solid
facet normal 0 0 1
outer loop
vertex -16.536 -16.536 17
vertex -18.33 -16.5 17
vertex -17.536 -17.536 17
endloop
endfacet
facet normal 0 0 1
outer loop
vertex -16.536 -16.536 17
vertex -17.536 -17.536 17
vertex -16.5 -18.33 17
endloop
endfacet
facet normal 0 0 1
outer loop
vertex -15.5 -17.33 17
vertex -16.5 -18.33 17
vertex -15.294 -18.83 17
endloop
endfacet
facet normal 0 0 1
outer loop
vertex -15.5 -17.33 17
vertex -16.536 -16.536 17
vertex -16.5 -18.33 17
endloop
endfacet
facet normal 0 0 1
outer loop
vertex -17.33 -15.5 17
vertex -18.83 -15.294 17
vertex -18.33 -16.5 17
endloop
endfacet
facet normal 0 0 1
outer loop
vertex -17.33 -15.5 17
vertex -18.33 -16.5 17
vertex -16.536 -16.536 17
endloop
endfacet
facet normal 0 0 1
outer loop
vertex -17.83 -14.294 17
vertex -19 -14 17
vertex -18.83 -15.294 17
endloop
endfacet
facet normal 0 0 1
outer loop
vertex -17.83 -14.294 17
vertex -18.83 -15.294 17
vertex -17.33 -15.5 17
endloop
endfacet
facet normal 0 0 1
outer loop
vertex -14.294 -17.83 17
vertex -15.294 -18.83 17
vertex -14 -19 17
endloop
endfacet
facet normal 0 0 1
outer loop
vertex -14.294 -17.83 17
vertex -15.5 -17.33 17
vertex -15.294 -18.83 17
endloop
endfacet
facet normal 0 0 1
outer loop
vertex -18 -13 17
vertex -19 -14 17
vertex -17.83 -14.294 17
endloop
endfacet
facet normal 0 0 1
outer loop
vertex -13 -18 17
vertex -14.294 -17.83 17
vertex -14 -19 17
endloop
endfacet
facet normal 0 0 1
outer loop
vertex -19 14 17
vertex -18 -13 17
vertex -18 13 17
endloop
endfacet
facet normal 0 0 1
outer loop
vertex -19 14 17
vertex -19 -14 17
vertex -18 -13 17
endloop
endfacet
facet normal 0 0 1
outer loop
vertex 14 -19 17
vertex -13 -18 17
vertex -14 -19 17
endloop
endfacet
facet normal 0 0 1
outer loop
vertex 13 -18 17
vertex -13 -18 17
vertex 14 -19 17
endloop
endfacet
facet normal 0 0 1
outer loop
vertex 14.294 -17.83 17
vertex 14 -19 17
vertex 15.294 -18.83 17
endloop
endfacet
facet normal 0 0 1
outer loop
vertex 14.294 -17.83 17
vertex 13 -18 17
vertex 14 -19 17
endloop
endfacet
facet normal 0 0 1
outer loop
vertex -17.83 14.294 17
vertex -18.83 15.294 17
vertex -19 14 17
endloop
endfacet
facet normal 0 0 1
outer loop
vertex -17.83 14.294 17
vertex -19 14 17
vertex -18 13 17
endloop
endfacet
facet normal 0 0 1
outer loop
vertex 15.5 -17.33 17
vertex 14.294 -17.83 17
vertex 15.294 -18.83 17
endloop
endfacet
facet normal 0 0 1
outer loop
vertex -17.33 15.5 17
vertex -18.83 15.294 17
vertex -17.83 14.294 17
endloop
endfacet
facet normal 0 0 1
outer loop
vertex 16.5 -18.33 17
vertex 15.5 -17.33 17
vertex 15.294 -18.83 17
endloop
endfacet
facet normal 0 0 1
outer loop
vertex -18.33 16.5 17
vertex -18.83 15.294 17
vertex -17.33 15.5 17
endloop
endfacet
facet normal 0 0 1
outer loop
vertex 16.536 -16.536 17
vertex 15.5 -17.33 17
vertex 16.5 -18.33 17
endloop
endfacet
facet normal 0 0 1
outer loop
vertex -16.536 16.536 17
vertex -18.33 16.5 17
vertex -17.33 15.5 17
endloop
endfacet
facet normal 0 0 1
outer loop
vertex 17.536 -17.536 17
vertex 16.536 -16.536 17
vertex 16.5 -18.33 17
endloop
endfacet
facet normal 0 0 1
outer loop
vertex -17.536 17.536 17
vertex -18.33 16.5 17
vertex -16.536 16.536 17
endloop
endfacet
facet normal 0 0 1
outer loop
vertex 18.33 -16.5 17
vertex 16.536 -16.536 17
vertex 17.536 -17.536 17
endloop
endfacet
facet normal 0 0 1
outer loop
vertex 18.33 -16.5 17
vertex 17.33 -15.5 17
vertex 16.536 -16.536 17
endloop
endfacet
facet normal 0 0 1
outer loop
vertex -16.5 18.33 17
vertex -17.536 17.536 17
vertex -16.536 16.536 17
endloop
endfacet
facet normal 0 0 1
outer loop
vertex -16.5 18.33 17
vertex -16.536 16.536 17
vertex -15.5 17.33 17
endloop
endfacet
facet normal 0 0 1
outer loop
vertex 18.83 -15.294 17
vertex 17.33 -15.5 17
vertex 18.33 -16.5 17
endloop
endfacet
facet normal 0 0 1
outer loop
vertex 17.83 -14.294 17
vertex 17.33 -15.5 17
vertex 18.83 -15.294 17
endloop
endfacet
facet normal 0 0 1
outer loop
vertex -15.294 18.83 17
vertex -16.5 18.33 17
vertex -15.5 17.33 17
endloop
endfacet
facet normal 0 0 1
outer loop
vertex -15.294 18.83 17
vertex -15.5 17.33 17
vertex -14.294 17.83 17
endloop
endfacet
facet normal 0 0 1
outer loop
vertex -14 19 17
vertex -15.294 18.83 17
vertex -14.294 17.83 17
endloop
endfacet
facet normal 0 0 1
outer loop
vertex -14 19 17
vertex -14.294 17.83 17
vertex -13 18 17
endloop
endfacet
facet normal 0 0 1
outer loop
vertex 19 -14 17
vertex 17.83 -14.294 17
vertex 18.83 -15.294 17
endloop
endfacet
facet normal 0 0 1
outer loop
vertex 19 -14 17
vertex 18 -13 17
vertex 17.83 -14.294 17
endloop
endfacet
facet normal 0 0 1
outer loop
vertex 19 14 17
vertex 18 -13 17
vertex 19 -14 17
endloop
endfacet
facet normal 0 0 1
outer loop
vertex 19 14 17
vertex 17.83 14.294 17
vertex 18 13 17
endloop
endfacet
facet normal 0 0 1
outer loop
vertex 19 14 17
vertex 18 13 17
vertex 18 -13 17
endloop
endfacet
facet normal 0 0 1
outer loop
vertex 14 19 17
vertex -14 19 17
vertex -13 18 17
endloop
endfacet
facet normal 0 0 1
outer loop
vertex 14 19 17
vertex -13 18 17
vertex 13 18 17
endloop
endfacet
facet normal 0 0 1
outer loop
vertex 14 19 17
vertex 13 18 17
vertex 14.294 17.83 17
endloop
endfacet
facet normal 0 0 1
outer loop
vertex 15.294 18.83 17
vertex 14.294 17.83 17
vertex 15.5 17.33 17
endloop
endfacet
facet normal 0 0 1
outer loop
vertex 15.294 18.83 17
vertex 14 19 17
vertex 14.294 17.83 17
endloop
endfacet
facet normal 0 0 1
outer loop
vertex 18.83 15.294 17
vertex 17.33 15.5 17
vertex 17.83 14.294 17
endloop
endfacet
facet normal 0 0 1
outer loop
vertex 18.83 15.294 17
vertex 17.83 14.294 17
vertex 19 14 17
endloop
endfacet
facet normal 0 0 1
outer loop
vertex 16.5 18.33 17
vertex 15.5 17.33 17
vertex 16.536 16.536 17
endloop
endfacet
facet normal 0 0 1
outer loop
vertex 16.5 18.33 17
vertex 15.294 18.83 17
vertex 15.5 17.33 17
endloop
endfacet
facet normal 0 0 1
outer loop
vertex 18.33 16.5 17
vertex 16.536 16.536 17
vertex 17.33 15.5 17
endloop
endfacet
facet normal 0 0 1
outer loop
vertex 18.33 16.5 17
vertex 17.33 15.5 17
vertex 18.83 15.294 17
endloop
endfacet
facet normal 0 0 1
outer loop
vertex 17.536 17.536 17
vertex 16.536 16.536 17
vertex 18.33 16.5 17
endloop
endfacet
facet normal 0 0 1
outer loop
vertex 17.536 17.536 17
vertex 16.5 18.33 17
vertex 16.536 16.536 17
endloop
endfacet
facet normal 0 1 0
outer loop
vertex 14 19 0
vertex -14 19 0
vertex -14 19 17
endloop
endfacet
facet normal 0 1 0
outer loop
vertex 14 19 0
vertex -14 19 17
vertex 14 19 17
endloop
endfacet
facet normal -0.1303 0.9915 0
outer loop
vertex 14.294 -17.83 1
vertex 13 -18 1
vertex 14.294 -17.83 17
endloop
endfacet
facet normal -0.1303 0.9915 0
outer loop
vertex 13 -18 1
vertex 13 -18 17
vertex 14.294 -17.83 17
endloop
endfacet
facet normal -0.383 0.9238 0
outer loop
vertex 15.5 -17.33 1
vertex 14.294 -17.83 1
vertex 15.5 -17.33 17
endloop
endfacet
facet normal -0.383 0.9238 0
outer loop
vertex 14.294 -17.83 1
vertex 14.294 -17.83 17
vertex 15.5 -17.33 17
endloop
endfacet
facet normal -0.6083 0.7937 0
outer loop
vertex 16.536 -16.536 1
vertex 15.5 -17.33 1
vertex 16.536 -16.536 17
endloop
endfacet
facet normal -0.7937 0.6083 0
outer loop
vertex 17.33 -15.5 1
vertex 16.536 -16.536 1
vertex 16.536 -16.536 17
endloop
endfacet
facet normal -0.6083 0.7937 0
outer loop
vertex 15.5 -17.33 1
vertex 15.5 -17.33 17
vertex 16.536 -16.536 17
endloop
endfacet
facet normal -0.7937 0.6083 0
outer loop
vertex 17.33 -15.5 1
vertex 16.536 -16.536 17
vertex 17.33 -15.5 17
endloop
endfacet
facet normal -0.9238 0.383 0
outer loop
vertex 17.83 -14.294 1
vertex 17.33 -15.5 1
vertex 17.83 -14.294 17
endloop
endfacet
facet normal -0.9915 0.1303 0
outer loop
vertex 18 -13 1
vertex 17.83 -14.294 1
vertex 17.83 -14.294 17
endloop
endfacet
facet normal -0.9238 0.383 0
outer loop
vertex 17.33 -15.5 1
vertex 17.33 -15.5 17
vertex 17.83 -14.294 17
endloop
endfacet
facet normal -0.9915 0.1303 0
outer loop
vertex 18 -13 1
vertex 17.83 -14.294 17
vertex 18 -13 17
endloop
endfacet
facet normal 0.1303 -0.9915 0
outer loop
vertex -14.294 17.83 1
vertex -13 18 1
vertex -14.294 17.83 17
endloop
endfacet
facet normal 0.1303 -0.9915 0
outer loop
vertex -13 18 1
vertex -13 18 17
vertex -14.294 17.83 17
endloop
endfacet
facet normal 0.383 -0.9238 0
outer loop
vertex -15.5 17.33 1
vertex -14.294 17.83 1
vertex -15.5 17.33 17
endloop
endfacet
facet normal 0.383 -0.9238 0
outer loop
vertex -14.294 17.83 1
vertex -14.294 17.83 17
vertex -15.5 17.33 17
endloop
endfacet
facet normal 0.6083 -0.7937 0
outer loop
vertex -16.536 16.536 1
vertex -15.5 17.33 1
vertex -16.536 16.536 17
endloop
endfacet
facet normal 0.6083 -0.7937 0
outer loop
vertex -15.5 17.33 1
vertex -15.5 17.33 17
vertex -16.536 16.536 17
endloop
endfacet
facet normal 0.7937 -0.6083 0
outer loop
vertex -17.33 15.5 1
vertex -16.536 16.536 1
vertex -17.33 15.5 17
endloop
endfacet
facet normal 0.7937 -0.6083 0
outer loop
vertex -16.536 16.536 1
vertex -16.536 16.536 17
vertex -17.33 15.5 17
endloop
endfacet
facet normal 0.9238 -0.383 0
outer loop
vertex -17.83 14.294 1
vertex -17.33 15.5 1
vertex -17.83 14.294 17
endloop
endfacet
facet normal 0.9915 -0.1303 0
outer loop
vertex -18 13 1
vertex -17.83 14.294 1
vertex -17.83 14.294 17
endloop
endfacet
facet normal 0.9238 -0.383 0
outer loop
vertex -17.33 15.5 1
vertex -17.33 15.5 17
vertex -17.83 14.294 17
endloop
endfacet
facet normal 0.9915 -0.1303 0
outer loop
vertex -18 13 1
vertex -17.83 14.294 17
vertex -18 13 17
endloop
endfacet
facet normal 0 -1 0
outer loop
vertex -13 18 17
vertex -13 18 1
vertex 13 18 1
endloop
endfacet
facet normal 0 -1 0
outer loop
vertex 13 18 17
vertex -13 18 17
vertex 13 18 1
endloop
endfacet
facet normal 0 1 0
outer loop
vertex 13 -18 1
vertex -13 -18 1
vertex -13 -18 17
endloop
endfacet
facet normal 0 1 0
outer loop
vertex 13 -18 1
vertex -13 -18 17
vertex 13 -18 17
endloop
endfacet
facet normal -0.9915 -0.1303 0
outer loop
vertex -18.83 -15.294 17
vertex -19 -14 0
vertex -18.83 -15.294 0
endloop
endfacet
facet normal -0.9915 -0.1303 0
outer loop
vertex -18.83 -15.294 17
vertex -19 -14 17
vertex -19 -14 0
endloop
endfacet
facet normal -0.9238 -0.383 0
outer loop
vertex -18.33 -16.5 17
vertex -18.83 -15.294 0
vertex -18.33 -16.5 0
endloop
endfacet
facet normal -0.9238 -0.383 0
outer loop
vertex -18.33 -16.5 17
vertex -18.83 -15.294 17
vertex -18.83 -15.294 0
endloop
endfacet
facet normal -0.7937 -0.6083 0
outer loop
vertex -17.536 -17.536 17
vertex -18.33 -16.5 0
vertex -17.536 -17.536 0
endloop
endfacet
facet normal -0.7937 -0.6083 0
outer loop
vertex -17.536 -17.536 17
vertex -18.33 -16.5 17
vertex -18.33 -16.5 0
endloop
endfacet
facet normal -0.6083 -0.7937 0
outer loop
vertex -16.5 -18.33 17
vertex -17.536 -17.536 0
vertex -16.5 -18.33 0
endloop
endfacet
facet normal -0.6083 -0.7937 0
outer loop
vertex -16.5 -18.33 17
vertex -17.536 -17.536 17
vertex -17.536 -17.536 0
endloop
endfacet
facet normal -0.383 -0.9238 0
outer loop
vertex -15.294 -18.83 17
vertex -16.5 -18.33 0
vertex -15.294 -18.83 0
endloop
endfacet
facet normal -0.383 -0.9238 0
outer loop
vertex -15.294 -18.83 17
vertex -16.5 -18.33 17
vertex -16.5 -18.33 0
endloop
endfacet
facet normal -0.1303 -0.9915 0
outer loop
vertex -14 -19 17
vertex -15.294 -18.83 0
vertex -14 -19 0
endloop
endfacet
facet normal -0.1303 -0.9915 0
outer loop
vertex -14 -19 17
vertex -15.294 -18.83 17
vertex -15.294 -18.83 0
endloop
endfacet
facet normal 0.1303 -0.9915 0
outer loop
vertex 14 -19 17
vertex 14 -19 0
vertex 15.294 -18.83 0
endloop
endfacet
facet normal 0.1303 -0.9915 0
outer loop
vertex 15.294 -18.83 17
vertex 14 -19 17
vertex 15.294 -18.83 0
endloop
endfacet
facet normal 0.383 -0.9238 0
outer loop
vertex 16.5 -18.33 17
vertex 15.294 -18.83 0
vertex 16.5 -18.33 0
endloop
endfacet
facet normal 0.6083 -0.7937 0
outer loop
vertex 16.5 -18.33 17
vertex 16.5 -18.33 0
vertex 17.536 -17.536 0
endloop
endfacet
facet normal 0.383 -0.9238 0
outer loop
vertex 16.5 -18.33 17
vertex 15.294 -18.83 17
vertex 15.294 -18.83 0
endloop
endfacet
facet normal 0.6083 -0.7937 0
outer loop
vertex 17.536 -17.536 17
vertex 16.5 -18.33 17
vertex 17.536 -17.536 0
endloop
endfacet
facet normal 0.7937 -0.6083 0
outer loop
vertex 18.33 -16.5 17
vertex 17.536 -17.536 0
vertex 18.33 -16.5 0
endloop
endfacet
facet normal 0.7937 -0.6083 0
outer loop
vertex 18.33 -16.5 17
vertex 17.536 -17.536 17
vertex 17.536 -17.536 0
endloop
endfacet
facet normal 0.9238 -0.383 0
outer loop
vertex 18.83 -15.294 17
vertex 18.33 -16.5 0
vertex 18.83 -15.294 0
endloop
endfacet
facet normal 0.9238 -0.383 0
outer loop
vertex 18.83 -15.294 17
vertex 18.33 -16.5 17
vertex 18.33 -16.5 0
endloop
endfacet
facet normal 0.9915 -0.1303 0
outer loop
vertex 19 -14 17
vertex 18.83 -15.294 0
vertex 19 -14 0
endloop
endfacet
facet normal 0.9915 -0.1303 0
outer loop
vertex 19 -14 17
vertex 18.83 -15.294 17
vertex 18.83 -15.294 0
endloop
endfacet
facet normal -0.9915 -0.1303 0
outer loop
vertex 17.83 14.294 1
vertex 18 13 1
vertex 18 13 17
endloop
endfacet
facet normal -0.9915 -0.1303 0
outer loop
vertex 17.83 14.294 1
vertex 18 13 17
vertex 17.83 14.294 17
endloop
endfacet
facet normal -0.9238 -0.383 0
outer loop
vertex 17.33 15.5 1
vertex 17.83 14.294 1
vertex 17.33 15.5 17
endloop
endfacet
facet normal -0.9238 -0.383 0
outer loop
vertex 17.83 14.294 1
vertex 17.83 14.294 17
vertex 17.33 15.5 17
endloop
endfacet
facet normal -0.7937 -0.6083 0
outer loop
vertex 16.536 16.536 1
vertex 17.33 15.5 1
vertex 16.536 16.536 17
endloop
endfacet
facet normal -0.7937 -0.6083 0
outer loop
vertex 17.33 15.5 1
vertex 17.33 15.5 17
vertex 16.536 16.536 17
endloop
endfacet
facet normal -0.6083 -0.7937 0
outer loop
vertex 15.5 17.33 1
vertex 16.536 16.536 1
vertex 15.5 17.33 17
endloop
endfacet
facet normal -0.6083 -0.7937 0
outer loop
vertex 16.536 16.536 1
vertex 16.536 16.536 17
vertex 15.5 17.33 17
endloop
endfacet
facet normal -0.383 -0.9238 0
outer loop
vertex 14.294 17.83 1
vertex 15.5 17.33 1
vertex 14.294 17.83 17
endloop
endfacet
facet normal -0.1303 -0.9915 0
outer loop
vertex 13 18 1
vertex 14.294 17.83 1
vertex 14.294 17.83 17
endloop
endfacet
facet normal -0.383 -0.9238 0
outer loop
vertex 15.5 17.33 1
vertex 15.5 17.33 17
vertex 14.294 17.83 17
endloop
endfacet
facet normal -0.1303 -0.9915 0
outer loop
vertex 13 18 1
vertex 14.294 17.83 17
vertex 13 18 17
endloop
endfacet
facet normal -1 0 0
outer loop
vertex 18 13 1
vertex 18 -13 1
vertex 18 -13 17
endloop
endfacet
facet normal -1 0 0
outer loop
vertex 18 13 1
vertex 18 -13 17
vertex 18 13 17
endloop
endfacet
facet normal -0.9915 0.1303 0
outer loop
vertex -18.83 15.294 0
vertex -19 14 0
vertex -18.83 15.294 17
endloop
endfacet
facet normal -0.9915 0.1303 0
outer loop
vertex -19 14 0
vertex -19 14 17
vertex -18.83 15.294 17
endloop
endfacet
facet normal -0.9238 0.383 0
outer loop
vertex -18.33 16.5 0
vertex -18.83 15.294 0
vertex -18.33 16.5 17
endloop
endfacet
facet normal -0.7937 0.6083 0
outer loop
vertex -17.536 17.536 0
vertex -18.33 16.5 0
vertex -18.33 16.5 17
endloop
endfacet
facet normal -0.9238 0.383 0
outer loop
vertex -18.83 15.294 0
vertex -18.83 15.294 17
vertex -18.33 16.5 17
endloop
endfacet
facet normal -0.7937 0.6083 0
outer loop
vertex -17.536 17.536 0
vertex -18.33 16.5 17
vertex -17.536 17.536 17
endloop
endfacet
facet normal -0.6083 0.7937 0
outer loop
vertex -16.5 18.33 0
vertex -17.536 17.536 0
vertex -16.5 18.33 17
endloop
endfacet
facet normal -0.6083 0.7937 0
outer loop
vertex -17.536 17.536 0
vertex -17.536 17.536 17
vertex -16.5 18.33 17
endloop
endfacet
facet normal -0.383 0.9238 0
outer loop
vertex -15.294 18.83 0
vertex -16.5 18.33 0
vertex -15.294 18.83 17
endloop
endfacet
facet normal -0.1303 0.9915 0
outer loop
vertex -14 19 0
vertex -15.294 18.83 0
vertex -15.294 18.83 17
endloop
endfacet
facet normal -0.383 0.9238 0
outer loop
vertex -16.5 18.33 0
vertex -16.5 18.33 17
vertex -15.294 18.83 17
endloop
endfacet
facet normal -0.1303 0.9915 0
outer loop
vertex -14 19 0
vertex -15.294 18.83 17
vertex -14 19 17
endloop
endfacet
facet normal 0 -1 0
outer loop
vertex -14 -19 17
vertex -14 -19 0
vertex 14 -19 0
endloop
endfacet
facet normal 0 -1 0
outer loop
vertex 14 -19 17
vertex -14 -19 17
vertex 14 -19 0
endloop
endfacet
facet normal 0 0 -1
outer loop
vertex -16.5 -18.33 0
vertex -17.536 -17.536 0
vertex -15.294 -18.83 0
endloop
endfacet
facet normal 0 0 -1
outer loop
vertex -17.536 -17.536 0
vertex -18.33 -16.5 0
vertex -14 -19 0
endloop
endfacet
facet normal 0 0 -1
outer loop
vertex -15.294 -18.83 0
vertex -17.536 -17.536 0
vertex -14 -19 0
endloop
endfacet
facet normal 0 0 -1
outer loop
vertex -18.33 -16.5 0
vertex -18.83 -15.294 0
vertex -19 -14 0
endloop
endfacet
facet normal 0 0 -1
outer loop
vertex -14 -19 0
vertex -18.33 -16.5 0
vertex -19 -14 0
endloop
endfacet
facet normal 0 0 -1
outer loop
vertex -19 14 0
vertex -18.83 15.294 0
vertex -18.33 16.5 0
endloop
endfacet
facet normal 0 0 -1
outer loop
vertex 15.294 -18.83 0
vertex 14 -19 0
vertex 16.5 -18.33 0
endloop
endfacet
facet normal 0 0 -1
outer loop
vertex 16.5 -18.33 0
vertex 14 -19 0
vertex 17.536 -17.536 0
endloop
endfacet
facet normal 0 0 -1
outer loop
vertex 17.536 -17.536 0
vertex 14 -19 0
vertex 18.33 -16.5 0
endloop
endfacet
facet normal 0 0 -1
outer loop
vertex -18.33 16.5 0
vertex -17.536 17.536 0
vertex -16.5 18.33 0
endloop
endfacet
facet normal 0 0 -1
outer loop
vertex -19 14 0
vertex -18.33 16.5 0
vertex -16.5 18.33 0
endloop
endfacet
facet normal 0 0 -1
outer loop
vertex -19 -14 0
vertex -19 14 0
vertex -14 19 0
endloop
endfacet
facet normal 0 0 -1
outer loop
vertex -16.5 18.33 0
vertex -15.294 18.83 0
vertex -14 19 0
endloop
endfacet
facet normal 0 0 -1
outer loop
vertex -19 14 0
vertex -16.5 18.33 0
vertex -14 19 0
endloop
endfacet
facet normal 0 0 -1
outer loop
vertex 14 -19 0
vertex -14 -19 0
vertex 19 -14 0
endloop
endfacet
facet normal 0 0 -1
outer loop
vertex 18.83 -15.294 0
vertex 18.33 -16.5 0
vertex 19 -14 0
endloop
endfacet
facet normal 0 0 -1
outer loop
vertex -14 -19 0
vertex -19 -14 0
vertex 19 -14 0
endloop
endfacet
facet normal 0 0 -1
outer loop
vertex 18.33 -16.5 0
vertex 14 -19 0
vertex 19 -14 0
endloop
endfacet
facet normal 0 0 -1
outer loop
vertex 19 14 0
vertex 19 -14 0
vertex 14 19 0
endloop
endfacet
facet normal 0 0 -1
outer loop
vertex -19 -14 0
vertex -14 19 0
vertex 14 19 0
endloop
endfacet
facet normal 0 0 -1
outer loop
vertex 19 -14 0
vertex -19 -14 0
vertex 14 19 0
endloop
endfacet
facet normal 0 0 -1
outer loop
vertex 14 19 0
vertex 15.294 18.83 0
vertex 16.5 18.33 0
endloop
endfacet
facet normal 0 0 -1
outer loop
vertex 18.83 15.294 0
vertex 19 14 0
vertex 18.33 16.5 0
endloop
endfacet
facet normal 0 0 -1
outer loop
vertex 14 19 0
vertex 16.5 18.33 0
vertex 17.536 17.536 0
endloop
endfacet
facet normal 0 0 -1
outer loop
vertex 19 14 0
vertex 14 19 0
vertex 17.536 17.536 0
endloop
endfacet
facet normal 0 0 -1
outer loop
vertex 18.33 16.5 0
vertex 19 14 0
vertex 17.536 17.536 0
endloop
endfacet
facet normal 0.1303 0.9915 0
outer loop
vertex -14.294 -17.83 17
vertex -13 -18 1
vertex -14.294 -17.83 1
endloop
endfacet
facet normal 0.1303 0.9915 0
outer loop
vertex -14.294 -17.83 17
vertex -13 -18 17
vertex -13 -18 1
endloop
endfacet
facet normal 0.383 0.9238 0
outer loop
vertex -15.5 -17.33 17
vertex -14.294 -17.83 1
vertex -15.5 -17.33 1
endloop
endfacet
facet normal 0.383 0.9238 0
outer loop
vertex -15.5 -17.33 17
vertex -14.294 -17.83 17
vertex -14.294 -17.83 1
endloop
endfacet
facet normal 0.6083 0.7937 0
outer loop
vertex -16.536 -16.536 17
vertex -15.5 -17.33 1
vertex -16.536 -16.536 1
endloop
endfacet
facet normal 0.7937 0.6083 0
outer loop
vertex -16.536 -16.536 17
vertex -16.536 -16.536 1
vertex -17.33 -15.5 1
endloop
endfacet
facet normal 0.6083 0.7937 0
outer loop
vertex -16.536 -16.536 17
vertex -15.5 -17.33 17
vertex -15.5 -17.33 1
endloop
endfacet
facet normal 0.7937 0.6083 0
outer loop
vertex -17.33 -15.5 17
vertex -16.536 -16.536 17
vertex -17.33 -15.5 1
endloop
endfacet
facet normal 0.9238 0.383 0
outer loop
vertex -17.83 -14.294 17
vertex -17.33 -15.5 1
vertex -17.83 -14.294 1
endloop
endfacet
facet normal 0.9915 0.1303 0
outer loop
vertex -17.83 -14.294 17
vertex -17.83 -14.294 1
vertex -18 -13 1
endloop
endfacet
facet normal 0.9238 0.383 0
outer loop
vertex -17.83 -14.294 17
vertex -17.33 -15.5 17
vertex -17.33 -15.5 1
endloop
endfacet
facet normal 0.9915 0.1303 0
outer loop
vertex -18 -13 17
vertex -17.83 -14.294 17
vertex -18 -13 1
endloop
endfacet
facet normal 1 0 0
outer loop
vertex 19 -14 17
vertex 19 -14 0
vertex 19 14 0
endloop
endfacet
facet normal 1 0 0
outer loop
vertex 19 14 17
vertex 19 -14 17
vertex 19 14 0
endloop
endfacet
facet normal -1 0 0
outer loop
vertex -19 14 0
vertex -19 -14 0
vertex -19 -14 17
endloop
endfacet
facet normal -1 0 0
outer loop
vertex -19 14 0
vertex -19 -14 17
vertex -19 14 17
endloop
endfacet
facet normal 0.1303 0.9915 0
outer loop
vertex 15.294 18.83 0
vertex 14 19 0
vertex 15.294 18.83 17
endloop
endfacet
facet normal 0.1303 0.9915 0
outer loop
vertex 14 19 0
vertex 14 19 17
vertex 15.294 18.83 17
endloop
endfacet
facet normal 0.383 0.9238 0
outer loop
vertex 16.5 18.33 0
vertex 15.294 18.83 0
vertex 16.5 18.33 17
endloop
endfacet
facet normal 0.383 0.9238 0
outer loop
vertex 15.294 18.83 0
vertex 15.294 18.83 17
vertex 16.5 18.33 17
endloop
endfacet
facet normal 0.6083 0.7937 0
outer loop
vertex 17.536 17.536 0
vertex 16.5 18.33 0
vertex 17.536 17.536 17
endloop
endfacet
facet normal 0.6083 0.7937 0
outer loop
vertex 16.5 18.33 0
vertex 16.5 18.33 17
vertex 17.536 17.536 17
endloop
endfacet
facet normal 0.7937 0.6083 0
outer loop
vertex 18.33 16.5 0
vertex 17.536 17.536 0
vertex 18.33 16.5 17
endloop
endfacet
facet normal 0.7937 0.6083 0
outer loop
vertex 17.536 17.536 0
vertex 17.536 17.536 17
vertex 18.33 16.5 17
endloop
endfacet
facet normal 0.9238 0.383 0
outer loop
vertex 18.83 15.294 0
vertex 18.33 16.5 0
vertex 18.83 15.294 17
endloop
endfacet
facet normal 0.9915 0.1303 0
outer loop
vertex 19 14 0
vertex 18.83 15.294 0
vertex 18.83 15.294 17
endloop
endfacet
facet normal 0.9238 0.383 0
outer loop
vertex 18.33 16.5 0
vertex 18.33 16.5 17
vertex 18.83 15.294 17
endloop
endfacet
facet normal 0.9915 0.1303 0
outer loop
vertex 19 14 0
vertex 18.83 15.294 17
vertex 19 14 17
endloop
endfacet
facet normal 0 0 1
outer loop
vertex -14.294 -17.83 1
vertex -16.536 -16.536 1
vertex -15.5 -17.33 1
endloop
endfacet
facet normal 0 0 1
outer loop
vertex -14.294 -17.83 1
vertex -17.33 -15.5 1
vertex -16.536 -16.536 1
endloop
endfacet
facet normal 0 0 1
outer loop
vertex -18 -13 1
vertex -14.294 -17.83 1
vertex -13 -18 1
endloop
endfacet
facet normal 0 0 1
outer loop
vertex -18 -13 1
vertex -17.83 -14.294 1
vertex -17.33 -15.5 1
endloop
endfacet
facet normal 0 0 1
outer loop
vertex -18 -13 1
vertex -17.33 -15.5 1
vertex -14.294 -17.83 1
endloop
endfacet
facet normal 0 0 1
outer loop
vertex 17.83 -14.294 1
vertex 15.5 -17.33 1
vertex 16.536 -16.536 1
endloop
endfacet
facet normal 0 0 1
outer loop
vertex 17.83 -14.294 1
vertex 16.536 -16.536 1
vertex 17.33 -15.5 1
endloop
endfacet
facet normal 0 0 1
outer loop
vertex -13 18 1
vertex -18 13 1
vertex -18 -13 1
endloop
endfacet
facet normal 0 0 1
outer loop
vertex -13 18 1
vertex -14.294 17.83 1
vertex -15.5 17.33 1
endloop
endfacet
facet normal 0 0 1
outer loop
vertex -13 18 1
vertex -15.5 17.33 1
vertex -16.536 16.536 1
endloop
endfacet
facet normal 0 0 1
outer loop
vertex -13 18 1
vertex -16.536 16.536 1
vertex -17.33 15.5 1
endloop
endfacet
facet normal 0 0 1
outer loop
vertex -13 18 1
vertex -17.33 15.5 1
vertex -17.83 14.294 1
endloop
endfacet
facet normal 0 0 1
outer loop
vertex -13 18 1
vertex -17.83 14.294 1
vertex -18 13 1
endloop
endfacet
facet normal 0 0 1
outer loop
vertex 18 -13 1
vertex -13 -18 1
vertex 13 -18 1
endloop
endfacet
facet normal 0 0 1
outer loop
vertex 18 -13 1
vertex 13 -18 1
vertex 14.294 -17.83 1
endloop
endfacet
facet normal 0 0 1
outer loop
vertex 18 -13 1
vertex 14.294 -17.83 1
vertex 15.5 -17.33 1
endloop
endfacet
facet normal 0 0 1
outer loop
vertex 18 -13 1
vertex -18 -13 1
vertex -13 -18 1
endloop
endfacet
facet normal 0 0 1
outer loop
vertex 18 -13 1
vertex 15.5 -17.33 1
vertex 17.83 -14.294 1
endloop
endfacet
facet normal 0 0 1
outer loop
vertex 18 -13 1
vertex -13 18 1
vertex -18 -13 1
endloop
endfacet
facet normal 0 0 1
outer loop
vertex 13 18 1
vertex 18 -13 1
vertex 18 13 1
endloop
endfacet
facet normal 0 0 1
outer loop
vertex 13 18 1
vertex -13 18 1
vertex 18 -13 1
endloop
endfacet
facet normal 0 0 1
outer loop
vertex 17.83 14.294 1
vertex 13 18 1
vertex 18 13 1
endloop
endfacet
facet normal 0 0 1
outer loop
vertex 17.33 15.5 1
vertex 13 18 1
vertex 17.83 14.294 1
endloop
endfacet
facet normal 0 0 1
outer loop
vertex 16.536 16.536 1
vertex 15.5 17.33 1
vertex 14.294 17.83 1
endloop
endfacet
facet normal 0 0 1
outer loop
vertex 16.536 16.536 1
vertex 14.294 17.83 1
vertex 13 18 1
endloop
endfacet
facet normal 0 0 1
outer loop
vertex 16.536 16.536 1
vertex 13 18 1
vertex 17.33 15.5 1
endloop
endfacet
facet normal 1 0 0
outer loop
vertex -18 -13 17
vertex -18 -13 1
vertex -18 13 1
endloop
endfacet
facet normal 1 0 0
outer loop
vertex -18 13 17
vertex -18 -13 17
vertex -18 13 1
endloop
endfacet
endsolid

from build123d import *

# Parameters (mm, degrees)
F0_W     = 36
F0_H     = 36
F1_DEPTH = 1
F0_W_2   = 38
F0_H_2   = 38
F2_DEPTH = 17
F3_R     = 5


with BuildPart() as f1:
    # F0 (on Top) → F1 (new body)
    with BuildSketch(Plane.XY):
        Rectangle(F0_W, F0_H)
    extrude(amount=F1_DEPTH)

    # F0 (on Top) → F2 (join)
    with BuildSketch(Plane.XY):
        Rectangle(F0_W_2, F0_H_2)
        Rectangle(F0_W, F0_H, mode=Mode.SUBTRACT)
    extrude(amount=F2_DEPTH)

    # F3
    f3_edges = [f1.edges().sort_by_distance(p)[0] for p in [
        (-18, 18, 9),
        (18, 18, 9),
        (18, -18, 9),
        (-18, -18, 9),
        (-19, 19, 8.5),
        (-19, -19, 8.5),
        (19, -19, 8.5),
        (19, 19, 8.5),
    ]]
    fillet(f3_edges, radius=F3_R)


solid = f1.part
